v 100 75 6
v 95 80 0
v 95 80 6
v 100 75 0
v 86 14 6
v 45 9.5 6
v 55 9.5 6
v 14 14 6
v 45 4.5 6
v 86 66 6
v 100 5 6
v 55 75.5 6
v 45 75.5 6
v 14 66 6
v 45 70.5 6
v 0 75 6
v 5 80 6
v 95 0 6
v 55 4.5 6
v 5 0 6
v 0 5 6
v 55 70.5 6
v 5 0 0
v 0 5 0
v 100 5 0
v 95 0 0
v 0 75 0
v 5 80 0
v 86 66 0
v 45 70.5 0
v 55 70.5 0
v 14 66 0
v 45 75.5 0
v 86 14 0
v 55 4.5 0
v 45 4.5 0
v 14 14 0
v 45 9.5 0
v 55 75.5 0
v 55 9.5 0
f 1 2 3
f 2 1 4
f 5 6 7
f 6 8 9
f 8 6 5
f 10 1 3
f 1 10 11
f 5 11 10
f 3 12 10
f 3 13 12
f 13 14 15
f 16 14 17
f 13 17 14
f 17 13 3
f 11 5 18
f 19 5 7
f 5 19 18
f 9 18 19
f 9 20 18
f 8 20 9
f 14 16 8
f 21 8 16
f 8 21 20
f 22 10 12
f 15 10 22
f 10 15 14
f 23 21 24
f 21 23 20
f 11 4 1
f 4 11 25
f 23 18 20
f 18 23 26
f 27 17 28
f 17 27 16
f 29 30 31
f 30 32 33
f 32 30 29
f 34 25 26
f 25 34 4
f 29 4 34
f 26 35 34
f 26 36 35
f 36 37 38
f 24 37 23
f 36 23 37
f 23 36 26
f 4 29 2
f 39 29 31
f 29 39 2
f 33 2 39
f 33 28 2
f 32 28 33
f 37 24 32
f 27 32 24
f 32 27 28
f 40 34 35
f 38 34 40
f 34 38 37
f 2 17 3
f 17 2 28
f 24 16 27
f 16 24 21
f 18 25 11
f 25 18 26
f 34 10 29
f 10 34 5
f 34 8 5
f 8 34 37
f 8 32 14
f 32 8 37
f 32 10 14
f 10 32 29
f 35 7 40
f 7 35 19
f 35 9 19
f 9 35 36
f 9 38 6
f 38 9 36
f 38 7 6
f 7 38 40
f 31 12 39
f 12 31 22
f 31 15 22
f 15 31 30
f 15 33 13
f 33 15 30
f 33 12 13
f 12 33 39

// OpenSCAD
$fn = 32;

// ----------------------------------------------------------------------
// Frame plate: 100 x 80 frame, 14 mm rails
// ----------------------------------------------------------------------

// --- parameters (mm) ---
plate_l = 100;            // plate length, X
plate_w = 80;             // plate width, Y
plate_t = 6;              // plate thickness, Z (extrusion height)
corner_c = 5;             // corner chamfer
frame_bar = 14;           // frame rail width
slot_l = 10;              // adjustment slot length
slot_w = 5;               // adjustment slot width

win_l = plate_l - 2 * frame_bar;  // window length
win_w = plate_w - 2 * frame_bar;  // window width

profile = [[5, 0], [95, 0], [100, 5], [100, 75], [95, 80], [5, 80], [0, 75], [0, 5]];  // primary outline, 8 points, counter clockwise
void_1 = [[14, 14], [86, 14], [86, 66], [14, 66]];  // the window, 4 points
void_2 = [[45, 4.5], [55, 4.5], [55, 9.5], [45, 9.5]];  // adjustment slot, 4 points
void_3 = [[45, 70.5], [55, 70.5], [55, 75.5], [45, 75.5]];  // adjustment slot, 4 points

// --- the one profile operation ---
difference() {
  linear_extrude(height = plate_t) polygon(points = profile);
  translate([0, 0, -1])
    linear_extrude(height = plate_t + 2) polygon(points = void_1);
  translate([0, 0, -1])
    linear_extrude(height = plate_t + 2) polygon(points = void_2);
  translate([0, 0, -1])
    linear_extrude(height = plate_t + 2) polygon(points = void_3);
}
